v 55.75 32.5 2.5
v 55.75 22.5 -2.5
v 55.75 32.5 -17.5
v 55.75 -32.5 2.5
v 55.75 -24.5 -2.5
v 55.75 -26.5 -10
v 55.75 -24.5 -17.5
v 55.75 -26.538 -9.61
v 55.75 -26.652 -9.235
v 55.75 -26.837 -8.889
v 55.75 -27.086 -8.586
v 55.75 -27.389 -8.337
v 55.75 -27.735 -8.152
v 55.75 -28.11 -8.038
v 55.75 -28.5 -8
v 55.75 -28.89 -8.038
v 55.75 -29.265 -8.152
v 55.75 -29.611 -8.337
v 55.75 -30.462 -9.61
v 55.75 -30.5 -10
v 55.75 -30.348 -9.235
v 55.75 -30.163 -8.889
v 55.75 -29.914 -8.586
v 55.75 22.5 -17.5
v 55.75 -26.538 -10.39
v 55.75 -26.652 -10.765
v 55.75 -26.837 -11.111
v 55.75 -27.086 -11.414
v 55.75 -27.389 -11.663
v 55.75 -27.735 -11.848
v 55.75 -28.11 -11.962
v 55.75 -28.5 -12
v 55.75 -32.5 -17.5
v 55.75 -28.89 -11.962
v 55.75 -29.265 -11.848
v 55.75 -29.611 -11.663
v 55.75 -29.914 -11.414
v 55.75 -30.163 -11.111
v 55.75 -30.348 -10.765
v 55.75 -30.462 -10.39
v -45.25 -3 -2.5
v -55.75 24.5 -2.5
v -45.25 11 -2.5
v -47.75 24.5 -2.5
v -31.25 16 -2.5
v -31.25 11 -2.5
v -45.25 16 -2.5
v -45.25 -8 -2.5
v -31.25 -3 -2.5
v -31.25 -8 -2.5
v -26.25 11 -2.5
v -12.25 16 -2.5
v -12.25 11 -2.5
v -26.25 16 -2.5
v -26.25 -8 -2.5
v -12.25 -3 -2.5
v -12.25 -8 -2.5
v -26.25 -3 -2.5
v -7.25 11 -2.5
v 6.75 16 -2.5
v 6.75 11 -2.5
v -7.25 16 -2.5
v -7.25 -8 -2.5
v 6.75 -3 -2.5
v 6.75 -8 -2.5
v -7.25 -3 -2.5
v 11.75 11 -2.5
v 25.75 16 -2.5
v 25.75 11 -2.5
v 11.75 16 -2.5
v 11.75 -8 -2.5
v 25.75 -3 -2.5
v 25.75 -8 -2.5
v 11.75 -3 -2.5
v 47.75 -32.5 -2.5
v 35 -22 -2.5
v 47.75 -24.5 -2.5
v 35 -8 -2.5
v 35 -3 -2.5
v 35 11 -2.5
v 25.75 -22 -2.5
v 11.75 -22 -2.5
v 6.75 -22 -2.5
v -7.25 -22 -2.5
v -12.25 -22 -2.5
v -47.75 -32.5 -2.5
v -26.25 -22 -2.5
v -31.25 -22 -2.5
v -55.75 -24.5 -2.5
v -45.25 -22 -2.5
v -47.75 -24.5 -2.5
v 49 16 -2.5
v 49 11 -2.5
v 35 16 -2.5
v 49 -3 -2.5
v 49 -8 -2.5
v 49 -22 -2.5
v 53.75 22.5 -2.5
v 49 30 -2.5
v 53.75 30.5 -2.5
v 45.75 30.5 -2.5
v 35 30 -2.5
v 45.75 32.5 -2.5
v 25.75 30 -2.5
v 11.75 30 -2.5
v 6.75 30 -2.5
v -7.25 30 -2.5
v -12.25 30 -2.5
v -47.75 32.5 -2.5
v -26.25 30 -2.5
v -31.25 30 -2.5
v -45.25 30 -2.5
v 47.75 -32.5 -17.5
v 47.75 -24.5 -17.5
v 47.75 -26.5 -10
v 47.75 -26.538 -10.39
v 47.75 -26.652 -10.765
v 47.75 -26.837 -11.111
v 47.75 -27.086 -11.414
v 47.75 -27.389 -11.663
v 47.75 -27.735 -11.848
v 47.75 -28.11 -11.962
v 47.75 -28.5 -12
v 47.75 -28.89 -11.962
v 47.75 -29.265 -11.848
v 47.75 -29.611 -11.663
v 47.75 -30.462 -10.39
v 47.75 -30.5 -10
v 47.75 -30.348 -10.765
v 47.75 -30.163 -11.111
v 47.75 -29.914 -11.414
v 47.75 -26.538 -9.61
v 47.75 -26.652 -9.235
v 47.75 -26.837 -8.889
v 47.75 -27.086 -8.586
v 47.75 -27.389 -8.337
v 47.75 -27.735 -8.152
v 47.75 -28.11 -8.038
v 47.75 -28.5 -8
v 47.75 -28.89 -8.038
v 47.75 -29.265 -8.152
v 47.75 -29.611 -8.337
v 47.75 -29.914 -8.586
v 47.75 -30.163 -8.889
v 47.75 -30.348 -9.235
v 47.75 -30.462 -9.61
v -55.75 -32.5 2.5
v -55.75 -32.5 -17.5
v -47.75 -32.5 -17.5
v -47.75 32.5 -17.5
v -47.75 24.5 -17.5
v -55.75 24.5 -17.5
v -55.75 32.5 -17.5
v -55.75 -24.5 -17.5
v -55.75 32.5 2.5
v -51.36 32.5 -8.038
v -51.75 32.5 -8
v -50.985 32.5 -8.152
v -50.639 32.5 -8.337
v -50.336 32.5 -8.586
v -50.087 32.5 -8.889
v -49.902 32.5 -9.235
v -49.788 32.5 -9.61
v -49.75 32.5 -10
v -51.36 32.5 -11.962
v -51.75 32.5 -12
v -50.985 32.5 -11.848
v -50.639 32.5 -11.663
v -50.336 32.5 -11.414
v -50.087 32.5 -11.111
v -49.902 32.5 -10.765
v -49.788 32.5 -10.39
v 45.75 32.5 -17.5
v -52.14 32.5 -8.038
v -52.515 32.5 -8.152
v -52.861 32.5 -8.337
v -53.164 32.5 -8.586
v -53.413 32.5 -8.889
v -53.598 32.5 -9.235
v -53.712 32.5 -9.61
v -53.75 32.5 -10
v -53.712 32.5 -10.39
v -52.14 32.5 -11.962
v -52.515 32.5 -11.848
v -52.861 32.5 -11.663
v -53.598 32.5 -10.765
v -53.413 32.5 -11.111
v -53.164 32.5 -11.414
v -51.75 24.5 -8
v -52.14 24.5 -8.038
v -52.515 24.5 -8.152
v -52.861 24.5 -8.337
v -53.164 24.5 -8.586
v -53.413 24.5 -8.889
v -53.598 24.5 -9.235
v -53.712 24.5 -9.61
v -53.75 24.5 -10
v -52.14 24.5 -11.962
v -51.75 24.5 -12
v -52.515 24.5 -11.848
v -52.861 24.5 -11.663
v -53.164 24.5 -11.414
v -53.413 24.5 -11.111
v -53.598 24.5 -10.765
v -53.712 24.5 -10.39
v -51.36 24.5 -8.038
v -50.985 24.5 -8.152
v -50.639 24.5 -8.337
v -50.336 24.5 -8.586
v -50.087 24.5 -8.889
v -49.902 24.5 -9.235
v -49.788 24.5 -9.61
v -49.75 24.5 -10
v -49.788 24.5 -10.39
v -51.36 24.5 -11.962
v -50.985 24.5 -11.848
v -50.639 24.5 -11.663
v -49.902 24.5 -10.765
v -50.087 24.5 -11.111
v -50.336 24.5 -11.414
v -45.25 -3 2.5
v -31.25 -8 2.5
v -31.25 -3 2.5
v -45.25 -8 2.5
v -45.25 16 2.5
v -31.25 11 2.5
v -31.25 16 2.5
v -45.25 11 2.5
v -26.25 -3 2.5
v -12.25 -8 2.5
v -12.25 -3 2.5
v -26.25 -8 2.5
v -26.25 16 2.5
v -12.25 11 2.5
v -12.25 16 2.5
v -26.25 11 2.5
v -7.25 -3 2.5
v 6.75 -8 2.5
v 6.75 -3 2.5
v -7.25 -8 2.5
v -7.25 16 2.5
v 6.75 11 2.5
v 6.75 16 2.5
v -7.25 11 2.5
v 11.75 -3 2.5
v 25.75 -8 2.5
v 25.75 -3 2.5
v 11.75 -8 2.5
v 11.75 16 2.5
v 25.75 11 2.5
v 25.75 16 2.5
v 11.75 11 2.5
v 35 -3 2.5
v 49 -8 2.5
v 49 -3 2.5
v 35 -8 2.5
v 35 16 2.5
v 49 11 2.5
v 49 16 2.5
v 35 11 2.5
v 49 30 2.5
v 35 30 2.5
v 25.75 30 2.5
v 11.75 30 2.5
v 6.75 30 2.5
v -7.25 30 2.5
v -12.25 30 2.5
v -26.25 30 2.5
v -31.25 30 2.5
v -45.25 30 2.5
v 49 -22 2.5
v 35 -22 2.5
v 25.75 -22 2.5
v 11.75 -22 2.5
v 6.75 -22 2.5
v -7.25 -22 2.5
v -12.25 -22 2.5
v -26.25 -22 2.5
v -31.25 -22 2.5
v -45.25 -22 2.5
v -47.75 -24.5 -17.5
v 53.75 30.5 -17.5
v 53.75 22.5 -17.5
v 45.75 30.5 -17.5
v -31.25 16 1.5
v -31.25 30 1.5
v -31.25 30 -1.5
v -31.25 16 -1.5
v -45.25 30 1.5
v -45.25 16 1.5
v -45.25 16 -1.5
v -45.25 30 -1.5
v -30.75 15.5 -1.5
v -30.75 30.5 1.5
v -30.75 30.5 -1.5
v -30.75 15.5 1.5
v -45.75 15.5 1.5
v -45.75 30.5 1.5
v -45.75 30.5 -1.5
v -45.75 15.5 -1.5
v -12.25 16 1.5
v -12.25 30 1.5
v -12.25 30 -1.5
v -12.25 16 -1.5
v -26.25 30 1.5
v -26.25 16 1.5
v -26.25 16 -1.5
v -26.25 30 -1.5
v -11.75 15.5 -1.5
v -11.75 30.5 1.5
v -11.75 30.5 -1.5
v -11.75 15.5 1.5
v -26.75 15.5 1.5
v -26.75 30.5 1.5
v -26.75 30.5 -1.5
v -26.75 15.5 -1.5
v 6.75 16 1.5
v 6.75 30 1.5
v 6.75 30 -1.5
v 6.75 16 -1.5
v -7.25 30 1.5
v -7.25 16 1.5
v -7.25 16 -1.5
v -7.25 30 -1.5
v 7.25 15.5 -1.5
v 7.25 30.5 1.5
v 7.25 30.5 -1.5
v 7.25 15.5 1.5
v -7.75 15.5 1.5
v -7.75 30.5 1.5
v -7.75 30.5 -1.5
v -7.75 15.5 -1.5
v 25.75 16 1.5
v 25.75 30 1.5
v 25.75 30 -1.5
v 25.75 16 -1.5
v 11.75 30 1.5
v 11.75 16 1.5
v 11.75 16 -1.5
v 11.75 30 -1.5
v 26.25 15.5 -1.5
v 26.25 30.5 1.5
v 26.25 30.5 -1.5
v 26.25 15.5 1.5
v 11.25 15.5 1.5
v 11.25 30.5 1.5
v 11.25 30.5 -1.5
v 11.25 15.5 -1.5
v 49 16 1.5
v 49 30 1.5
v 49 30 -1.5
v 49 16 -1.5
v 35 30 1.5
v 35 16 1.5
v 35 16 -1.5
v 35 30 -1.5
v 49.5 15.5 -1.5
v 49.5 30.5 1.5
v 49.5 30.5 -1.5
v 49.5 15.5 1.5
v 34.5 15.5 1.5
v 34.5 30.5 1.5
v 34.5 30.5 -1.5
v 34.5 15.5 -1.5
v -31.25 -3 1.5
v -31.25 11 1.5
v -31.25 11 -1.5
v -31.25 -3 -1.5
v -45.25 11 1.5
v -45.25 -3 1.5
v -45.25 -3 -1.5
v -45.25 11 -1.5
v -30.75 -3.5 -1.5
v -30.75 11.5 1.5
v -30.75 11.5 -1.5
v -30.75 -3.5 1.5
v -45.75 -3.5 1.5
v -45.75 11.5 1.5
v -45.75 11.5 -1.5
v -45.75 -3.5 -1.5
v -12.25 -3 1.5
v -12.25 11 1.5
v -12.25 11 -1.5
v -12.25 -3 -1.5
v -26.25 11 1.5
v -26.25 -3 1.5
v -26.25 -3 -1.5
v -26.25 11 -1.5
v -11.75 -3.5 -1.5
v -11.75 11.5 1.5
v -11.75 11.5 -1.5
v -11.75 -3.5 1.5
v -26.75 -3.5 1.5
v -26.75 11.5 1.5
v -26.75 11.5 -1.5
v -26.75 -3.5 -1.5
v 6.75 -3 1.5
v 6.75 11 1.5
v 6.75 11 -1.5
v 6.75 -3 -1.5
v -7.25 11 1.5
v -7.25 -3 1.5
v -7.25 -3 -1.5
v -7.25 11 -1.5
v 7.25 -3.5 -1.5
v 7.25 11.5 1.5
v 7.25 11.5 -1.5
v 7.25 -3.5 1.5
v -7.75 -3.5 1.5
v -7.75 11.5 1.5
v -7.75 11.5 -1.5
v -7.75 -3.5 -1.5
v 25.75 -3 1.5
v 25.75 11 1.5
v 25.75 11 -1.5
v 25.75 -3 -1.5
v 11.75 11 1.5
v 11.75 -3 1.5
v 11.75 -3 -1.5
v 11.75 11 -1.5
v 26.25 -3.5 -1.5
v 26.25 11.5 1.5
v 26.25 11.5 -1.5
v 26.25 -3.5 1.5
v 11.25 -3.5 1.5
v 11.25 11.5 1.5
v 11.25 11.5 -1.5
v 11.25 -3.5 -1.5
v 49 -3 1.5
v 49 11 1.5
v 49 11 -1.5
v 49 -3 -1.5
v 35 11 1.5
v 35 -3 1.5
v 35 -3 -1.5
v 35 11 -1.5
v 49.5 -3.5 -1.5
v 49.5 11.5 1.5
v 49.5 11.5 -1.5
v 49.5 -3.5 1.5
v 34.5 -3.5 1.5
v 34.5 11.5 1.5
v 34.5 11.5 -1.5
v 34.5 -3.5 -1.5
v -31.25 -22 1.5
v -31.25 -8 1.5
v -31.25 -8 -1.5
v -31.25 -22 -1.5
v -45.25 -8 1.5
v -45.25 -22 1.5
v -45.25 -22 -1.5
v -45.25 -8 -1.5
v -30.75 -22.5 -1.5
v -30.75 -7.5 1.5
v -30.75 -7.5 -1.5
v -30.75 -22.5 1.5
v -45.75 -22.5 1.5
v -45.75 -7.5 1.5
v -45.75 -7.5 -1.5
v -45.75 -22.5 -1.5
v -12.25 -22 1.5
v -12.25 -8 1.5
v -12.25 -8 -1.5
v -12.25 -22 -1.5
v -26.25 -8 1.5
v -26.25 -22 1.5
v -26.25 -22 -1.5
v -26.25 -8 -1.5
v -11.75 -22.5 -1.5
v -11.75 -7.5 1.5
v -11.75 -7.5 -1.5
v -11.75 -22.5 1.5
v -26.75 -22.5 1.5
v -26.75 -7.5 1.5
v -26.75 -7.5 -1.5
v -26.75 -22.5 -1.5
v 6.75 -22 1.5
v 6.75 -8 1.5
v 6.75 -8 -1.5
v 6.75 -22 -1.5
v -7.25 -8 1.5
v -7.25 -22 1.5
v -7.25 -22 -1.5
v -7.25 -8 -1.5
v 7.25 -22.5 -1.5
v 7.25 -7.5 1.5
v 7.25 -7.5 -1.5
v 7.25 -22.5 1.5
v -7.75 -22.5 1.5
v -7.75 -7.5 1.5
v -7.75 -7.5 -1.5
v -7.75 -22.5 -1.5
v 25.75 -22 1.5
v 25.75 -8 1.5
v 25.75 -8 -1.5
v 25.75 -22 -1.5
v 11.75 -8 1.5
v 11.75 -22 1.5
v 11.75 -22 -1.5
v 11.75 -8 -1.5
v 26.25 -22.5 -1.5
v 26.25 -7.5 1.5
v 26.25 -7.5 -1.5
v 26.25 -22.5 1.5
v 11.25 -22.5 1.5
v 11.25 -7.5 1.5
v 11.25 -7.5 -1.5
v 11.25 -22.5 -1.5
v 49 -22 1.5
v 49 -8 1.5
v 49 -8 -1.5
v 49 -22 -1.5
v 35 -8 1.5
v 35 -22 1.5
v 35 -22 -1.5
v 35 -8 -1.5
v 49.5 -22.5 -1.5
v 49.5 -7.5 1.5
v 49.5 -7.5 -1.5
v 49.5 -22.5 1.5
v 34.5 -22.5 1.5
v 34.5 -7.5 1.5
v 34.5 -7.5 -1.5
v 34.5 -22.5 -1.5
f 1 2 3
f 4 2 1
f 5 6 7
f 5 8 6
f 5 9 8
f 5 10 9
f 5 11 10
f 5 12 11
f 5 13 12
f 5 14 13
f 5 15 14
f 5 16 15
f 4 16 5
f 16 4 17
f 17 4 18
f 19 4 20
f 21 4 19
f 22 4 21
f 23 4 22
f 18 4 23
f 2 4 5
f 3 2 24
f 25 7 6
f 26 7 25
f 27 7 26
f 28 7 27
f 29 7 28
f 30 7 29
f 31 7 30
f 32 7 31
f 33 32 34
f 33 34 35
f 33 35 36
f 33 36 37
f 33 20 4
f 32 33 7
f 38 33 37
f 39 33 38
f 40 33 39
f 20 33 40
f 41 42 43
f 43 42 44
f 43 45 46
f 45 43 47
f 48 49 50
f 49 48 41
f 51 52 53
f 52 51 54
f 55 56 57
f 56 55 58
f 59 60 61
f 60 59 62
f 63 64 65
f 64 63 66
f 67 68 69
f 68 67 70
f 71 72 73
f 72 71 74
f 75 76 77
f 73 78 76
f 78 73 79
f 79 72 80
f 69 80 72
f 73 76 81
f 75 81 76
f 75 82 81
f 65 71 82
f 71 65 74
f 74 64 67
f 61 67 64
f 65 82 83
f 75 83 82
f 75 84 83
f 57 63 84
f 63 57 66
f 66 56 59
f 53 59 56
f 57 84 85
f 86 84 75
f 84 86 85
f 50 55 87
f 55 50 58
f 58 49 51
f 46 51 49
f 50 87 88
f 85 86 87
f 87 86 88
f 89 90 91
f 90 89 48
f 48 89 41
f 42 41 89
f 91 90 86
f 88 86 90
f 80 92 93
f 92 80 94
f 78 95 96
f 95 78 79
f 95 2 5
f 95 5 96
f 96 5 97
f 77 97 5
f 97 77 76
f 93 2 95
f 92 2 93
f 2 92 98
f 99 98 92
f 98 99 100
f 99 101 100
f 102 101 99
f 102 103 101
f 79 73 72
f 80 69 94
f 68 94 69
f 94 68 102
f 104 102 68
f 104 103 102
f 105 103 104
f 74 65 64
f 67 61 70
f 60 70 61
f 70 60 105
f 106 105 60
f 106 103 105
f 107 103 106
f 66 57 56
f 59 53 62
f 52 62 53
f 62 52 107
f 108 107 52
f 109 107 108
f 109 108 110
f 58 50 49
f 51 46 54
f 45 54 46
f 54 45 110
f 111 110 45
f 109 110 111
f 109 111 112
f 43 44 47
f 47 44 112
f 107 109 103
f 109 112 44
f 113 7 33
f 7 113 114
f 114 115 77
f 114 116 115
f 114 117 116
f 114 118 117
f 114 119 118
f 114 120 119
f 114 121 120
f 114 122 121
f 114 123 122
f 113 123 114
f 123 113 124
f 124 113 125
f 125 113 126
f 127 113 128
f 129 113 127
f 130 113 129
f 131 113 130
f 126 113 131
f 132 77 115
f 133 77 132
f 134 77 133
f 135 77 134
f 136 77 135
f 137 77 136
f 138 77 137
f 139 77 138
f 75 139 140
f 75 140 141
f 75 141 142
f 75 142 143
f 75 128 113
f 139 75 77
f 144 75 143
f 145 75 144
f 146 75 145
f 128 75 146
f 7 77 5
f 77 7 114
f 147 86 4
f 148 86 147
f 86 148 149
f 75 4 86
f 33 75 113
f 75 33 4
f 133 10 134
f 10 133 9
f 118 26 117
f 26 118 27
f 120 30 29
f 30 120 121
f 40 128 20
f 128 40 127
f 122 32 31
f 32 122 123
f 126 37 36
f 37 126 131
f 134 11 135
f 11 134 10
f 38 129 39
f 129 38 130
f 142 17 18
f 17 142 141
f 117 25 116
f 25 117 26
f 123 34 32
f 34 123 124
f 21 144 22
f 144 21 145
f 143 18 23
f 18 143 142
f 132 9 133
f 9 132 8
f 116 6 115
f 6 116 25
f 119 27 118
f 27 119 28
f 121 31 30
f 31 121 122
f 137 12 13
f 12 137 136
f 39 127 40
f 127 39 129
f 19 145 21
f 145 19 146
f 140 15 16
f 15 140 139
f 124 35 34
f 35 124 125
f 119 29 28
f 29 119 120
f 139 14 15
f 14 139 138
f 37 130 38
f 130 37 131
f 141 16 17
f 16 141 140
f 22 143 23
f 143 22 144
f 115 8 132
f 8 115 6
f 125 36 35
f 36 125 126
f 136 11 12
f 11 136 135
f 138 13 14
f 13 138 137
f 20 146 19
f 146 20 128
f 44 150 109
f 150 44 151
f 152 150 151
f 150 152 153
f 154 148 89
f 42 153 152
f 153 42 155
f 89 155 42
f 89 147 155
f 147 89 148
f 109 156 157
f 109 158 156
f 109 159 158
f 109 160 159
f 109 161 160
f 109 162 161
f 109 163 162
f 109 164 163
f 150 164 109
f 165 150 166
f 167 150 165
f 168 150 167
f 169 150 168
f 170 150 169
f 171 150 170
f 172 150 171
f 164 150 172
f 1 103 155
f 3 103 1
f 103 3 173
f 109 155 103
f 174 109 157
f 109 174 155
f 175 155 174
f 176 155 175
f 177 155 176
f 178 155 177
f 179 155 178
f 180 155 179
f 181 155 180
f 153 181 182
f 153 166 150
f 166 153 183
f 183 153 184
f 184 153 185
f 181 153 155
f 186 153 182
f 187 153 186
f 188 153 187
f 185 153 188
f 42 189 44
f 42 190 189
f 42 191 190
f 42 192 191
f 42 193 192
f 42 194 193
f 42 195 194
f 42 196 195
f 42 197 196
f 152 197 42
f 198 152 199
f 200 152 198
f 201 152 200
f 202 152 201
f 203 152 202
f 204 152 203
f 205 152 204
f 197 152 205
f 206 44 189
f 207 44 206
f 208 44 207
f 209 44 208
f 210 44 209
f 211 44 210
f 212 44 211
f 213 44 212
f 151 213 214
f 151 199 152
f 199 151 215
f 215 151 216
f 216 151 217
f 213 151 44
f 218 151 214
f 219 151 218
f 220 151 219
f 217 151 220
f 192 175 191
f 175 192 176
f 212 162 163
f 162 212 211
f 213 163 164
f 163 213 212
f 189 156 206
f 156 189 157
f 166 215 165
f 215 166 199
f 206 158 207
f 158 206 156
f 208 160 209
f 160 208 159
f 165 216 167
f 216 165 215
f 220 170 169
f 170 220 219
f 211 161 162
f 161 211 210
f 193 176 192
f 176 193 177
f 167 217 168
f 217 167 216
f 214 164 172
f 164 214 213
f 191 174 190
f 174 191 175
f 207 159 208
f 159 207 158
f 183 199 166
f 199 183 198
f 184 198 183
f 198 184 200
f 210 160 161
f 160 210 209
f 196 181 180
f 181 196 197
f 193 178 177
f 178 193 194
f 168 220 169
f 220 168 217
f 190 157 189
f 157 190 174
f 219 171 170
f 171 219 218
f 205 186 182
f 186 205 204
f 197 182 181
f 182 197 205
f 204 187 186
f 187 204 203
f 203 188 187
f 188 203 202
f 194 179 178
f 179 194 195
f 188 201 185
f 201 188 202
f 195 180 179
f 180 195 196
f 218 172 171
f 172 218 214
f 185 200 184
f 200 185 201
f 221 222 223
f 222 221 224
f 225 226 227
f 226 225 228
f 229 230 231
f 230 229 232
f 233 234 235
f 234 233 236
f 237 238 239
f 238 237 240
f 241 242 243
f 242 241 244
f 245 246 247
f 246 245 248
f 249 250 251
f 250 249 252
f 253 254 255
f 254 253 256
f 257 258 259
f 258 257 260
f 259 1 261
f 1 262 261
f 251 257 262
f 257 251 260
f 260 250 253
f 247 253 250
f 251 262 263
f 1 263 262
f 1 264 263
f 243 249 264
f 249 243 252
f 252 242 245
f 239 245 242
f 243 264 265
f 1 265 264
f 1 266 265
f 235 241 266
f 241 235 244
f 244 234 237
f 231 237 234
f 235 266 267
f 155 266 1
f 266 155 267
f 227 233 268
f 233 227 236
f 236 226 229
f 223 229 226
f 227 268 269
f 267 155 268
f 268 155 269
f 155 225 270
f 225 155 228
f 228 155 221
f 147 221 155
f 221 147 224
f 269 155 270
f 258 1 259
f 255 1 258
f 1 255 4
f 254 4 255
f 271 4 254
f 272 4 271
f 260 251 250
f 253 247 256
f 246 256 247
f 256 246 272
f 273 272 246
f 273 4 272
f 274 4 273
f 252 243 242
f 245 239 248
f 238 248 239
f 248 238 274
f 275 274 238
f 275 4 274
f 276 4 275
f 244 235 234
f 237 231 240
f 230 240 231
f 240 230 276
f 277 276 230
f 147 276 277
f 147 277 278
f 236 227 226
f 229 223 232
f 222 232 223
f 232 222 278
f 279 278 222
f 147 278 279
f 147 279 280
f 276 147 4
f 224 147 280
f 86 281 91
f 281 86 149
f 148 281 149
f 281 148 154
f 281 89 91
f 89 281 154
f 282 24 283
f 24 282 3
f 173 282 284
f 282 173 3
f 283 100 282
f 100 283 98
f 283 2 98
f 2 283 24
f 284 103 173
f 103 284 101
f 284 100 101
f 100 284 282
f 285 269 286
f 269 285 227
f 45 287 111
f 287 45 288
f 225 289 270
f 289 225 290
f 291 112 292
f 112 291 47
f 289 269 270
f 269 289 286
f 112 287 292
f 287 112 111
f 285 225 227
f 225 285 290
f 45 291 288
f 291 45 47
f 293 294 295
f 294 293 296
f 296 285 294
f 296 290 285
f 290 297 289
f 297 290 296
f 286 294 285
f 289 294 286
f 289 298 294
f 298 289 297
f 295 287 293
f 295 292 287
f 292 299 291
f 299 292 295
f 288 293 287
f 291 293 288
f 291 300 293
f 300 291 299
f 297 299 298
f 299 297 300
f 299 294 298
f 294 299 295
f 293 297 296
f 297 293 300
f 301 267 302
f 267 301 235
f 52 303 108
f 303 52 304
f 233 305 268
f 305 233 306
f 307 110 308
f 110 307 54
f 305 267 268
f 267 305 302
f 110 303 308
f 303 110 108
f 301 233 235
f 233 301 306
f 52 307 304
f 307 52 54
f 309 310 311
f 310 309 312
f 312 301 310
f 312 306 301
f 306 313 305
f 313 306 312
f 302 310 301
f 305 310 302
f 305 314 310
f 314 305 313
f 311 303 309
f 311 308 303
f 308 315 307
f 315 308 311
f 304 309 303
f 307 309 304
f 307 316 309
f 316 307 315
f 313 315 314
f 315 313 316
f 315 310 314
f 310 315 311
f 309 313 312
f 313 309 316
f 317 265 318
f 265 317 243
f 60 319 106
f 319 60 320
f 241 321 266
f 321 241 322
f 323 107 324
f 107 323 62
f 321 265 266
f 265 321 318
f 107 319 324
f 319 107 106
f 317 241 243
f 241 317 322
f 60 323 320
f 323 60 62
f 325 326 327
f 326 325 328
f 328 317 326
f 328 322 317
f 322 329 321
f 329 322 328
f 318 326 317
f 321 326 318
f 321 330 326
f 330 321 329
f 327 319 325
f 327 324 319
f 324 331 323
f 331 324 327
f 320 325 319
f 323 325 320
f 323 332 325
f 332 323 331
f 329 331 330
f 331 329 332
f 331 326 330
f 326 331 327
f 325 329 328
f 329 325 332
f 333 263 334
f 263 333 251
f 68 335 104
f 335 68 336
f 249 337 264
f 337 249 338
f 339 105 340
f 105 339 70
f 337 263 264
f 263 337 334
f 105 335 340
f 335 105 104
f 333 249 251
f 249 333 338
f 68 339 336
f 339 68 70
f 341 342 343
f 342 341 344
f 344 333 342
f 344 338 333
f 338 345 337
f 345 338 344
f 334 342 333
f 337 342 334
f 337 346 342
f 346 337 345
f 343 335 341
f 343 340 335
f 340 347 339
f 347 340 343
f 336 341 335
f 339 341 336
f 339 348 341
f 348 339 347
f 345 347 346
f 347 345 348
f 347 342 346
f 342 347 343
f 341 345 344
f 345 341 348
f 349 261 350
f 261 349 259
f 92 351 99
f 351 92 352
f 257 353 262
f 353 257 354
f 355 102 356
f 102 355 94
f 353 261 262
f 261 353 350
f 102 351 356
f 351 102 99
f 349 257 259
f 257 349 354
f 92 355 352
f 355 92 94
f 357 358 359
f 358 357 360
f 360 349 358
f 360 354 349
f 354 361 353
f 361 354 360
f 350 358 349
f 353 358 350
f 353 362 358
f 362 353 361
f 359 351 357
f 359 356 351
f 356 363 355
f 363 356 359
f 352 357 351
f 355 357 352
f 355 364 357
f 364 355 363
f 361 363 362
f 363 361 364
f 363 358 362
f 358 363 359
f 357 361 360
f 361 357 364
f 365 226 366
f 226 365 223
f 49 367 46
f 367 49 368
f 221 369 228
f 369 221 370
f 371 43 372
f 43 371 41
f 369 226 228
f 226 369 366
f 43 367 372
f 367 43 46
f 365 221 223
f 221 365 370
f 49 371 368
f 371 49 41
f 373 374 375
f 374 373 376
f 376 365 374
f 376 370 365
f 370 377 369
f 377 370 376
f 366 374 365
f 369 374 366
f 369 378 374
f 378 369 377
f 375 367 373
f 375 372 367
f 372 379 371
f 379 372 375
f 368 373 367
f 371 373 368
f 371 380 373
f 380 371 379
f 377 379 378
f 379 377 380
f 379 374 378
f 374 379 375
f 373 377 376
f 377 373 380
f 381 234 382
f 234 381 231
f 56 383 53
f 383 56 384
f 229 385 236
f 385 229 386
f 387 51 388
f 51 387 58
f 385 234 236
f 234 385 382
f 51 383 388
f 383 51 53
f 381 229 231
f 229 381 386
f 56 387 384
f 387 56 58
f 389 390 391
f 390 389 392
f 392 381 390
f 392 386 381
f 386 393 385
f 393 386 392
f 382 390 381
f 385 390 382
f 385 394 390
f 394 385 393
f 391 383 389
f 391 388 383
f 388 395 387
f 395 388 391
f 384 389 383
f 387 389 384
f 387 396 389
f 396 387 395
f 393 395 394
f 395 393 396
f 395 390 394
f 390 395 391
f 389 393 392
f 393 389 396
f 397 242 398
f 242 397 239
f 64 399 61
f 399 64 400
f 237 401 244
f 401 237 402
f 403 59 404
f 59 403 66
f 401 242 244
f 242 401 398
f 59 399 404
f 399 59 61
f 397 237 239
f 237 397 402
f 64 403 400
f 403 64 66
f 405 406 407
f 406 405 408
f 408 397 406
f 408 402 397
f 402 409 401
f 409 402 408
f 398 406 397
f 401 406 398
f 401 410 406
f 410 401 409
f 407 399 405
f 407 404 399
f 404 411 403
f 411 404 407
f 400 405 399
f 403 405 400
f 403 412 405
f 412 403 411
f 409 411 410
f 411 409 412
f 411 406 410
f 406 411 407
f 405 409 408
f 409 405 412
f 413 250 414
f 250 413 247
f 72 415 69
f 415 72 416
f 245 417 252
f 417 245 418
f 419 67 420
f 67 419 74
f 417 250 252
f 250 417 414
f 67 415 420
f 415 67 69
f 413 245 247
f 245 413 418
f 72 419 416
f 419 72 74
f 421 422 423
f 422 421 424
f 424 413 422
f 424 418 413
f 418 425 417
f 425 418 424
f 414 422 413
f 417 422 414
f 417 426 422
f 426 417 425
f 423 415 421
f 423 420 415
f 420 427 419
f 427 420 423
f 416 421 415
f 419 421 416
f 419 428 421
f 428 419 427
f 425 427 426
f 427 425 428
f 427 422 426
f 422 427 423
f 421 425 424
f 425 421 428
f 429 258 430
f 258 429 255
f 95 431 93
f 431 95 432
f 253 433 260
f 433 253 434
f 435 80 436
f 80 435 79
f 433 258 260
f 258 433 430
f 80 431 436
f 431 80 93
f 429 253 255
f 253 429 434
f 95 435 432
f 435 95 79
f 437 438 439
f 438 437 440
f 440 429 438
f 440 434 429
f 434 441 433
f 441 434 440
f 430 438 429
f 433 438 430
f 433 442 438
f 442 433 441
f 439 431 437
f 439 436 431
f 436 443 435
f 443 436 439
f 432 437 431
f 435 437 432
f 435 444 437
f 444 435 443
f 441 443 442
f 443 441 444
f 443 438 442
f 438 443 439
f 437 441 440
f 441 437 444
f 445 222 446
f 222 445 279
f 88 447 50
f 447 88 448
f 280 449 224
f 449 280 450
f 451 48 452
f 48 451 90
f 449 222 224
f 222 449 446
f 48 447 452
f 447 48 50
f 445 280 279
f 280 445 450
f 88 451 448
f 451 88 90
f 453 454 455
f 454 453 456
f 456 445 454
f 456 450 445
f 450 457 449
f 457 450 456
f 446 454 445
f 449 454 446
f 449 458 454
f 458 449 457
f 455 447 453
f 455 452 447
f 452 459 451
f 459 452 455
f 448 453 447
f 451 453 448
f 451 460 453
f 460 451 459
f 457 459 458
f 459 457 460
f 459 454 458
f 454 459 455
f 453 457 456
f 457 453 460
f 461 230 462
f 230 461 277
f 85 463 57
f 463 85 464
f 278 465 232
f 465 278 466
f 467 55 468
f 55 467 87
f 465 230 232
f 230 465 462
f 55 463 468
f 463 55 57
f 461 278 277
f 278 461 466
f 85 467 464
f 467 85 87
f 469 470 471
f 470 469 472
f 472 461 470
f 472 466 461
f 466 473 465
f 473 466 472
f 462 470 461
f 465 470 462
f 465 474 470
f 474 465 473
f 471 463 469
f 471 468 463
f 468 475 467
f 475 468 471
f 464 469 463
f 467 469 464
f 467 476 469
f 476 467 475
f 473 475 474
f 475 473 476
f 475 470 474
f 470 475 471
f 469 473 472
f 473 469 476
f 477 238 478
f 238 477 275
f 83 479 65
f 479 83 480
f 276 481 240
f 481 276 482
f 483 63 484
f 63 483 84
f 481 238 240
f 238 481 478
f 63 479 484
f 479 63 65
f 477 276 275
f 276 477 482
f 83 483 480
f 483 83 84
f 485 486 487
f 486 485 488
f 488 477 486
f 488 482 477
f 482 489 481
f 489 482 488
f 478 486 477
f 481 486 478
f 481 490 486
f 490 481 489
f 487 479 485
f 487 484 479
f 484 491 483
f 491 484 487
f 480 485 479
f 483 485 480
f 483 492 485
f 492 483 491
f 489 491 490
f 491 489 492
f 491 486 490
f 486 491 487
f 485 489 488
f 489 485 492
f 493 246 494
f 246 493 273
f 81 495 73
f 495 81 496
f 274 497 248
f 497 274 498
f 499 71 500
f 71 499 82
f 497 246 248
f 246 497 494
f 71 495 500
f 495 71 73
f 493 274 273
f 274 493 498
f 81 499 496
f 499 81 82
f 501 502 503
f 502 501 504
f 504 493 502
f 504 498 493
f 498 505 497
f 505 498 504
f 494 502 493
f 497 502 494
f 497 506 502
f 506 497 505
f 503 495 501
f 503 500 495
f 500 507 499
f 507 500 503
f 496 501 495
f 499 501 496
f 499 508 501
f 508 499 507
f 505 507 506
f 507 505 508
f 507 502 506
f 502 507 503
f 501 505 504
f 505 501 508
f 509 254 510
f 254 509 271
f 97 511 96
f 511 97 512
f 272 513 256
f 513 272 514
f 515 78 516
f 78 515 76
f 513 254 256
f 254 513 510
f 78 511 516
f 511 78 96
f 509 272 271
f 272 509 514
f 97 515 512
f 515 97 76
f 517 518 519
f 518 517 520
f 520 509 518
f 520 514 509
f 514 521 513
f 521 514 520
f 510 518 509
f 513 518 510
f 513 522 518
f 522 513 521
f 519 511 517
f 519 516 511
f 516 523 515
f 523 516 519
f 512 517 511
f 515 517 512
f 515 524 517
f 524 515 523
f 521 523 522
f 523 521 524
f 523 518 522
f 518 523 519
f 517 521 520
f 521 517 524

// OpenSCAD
// file: common.scad
key_size = 14;

b_post = 8;
m_post_s = 2;
m_post_l = 10;
post_z = 15;

plat_z = 5;

module keyhole(x, y) {
  translate([x, y, 0]) {
    cube([key_size, key_size, plat_z + 1], center = true);
    cube([key_size + 1, key_size + 1, plat_z -2], center = true);
  }
}

module e_post(x, y, z) {
  translate([x, y, -(plat_z + post_z)/2]) {
    cube([b_post, b_post, post_z], center = true);
  }
}

module e_post_i(x, y, r) {
  translate([x, y, -(plat_z + post_z)/2]) {
    difference() {
      cube([b_post, b_post, post_z], center = true);
      rotate(r) cylinder(h=b_post+1, r=2, center=true, $fn=32);
    }
  }
}

module e_post_x(x, y) {
  e_post_i(x, y, [0, 90, 0]);
}


module e_post_y(x, y) {
  e_post_i(x, y, [90, 0, 0]);
}

module i_post_x(x, y) {
  translate([x, y, -(plat_z + post_z)/2]) cube([m_post_l, m_post_s, post_z], center = true);
}

module i_post_y(x, y) {
  translate([x, y, -(plat_z + post_z)/2]) cube([m_post_s, m_post_l, post_z], center = true);
}
// file: parameters.scad
key_size = 14;
key_sep = 5;
m_key_sep = 13.5;
l_key_sep = 33;

border = 8;
b_post = 8;
m_post_s = 2;
m_post_l = 10;
post_z = 15;

key_cell = key_size + key_sep;
m_key_cell_x = key_size + m_key_sep;
l_key_cell_x = 2*key_cell;

plat_z = 5;
// main file
// Ortho Mega section 5: bottom left corner

include <parameters.scad>

plat_x = border + 4*key_cell + m_key_cell_x;
plat_y = border + 3*key_cell;

use <common.scad>

difference() {
  union() {
    cube([plat_x, plat_y, 5], center = true);
    e_post(-(plat_x-b_post)/2, -(plat_y-b_post)/2);
    
    e_post_x((plat_x-b_post)/2, -(plat_y-b_post)/2);
    e_post_y(-(plat_x-b_post)/2, (plat_y-b_post)/2);

    i_post_y((plat_x - m_post_s)/2, (plat_y - m_post_l)/2);
    i_post_x((plat_x - m_post_l)/2, (plat_y - m_post_s)/2);
  }

  for (y = [0:2]) {
    for (x = [0:3]) {
      keyhole(-plat_x/2 + border + key_cell/2 + x*key_cell, plat_y/2 - key_cell/2 - y*key_cell);
    }
    keyhole(plat_x/2 - m_key_cell_x/2, plat_y/2 - key_cell/2 - y*key_cell);
  }
}
